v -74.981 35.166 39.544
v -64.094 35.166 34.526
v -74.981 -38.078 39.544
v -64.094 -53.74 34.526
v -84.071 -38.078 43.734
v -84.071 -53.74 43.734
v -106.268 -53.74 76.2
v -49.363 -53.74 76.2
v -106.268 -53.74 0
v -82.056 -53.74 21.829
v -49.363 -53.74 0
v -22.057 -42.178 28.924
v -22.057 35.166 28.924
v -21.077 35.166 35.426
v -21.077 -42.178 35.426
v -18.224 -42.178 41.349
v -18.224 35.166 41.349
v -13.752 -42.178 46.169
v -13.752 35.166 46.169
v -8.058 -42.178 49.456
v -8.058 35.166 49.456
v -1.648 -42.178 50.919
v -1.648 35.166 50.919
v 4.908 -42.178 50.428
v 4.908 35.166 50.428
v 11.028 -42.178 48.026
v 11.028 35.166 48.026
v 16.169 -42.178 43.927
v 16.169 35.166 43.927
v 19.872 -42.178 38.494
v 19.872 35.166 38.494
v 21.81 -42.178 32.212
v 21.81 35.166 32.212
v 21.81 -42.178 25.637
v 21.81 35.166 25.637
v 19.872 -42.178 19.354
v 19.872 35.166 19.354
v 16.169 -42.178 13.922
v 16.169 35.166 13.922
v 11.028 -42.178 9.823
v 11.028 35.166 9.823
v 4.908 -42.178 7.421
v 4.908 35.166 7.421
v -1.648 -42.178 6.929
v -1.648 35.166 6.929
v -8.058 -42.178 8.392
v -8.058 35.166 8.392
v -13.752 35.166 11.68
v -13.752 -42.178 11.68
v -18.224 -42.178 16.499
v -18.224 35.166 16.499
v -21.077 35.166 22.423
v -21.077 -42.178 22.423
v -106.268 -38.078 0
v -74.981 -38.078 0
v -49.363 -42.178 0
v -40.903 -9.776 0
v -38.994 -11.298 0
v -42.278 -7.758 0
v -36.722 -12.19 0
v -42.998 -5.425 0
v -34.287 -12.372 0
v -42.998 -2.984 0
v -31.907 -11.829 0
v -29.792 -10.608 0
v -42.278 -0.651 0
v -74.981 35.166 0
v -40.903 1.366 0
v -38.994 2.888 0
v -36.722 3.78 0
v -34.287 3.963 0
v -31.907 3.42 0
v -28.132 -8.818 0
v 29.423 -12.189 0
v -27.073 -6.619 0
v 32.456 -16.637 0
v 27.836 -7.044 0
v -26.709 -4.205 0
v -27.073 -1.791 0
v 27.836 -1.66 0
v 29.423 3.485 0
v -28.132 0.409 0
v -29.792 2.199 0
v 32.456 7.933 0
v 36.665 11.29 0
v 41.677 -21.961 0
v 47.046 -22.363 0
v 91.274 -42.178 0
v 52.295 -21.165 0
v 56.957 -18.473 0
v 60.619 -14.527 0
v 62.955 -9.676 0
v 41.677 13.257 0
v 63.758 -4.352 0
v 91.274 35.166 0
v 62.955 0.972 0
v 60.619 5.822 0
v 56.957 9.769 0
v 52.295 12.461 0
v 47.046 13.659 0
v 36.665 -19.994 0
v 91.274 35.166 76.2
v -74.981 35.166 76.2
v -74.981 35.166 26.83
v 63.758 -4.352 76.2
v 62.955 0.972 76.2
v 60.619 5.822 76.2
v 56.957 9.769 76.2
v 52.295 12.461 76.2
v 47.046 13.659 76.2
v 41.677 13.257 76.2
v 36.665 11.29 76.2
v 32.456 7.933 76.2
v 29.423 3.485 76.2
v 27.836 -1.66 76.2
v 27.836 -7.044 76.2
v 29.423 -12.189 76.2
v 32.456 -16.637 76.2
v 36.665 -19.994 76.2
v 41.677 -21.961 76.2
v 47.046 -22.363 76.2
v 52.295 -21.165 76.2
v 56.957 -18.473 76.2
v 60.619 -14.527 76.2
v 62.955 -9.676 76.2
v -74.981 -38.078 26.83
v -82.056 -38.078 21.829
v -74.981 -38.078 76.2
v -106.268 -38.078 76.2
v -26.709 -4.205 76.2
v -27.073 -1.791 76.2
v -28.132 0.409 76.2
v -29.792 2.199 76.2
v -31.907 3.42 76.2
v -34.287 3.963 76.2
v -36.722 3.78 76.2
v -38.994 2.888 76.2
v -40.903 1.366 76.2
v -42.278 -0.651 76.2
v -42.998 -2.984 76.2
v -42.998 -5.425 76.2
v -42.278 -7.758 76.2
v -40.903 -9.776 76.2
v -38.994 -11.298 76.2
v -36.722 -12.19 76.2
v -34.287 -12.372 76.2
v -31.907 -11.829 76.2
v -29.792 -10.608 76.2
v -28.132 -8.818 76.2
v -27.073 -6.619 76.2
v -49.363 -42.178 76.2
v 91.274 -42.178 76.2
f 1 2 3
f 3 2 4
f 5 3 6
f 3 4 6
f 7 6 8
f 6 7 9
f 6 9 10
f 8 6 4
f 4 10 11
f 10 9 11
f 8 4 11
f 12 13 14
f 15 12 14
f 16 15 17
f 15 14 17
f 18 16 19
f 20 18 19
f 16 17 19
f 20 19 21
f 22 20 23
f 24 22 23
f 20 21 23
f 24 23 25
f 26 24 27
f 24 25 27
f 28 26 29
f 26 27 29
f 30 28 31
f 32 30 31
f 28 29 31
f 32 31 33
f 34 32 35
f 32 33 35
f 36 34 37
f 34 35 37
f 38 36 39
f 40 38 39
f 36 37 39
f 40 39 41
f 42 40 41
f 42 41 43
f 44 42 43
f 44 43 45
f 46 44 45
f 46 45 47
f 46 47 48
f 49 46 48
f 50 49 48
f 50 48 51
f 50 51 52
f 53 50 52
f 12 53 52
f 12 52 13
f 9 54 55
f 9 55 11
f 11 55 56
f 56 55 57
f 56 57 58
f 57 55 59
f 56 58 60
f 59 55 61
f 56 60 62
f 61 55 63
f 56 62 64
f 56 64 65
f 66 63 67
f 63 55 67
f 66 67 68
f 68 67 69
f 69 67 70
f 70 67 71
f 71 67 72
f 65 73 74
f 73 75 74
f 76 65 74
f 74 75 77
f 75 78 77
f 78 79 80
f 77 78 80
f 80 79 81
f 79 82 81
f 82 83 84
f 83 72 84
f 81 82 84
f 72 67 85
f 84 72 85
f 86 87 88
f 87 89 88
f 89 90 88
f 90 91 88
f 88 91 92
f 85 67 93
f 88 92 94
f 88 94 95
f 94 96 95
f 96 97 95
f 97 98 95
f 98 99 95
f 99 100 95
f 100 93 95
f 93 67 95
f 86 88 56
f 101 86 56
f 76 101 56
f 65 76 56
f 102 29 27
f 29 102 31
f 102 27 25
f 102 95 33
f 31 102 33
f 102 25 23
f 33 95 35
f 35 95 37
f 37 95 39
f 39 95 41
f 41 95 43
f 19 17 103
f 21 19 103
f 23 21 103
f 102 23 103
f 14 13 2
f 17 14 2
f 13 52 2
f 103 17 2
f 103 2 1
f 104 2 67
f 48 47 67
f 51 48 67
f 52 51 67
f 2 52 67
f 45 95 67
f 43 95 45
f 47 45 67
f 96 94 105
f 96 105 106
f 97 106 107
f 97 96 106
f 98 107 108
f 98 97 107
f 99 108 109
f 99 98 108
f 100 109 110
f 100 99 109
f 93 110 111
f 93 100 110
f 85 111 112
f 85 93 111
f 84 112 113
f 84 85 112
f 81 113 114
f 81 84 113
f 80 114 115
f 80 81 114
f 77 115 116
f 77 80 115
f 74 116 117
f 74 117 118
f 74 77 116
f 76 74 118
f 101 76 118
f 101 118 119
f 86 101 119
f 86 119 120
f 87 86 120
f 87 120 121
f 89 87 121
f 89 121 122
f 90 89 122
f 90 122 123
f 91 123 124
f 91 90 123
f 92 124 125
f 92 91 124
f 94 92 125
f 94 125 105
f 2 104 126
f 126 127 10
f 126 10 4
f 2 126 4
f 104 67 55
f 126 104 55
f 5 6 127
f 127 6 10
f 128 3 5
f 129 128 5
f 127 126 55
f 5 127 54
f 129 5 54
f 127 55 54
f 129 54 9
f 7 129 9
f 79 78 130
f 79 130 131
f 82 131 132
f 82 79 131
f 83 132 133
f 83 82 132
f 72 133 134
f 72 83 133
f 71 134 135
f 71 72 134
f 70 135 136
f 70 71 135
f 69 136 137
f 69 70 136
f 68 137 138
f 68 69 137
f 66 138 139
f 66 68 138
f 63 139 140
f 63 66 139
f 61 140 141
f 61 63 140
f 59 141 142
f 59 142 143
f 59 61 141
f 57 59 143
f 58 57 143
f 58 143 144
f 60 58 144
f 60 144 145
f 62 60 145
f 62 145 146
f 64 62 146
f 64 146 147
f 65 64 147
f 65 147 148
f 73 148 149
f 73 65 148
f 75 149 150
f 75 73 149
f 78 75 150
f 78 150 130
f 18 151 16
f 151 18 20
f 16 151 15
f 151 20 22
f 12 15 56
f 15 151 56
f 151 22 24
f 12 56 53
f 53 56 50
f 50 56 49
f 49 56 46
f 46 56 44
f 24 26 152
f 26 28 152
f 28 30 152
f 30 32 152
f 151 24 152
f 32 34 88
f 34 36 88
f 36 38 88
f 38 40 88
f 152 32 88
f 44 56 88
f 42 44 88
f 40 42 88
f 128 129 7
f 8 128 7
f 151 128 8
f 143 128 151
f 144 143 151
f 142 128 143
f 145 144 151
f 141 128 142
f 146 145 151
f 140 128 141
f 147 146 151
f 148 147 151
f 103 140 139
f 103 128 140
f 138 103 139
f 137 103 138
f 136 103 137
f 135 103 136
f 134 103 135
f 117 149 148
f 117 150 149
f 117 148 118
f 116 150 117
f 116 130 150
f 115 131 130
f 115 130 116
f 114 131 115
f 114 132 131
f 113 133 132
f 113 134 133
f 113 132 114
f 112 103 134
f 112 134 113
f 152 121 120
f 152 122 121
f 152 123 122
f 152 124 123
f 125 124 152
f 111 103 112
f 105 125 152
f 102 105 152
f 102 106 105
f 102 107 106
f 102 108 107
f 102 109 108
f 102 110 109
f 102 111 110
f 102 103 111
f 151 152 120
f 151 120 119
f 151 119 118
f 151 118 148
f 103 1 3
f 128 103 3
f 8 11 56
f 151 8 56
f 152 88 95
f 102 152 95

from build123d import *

# Parameters (mm, degrees)
F0_R     = 8.190345508
F0_R_2   = 18.0615768445
F0_W     = 25.6181135774
F0_H     = 4.1002519429
F1_DEPTH = 76.2
F3_DEPTH = 88.9068820903
F4_R     = 22.0566851371
F5_DEPTH = 88.9068820903


with BuildPart() as f1:
    # F0 (on Top) → F1 (new body)
    with BuildSketch(Plane.XY):
        Polygon((91.2738516927, 35.1657494903), (-74.9807953835, 35.1657494903), (-74.9807953835, -38.0775630474), (-49.3626818061, -38.0775630474), (-49.3626818061, -42.1778149903), (91.2738516927, -42.1778149903), align=None)
        with Locations((-34.8990187049, -4.2046573944)):
            Circle(F0_R, mode=Mode.SUBTRACT)
        with Locations((45.6959344447, -4.3521164916)):
            Circle(F0_R_2, mode=Mode.SUBTRACT)
        Polygon((-74.9807953835, -42.1778149903), (-74.9807953835, -38.0775630474), (-106.267772615, -38.0775630474), (-106.267772615, -53.7401326001), (-49.3626818061, -53.7401326001), (-49.3626818061, -42.1778149903), align=None)
        with Locations((-62.1717385948, -40.1276890188)):
            Rectangle(F0_W, F0_H)
    extrude(amount=F1_DEPTH)

    # F2 (on face) → F3 (cut, through all)
    with BuildSketch(Plane.XZ.offset(53.7401326001)):
        Polygon((-64.0935031806, 34.5261069518), (-84.0708138313, 43.7335528065), (-82.05604052, 21.8289713563), align=None)
    extrude(amount=-F3_DEPTH, mode=Mode.SUBTRACT)

    # F4 (on face) → F5 (cut, through all)
    with BuildSketch(Plane(origin=(0, 35.1657494903, 0), x_dir=(-1, 0, 0), z_dir=(0, 1, 0))):
        with Locations((0, 28.9242751896)):
            Circle(F4_R)
    extrude(amount=-F5_DEPTH, mode=Mode.SUBTRACT)


solid = f1.part
